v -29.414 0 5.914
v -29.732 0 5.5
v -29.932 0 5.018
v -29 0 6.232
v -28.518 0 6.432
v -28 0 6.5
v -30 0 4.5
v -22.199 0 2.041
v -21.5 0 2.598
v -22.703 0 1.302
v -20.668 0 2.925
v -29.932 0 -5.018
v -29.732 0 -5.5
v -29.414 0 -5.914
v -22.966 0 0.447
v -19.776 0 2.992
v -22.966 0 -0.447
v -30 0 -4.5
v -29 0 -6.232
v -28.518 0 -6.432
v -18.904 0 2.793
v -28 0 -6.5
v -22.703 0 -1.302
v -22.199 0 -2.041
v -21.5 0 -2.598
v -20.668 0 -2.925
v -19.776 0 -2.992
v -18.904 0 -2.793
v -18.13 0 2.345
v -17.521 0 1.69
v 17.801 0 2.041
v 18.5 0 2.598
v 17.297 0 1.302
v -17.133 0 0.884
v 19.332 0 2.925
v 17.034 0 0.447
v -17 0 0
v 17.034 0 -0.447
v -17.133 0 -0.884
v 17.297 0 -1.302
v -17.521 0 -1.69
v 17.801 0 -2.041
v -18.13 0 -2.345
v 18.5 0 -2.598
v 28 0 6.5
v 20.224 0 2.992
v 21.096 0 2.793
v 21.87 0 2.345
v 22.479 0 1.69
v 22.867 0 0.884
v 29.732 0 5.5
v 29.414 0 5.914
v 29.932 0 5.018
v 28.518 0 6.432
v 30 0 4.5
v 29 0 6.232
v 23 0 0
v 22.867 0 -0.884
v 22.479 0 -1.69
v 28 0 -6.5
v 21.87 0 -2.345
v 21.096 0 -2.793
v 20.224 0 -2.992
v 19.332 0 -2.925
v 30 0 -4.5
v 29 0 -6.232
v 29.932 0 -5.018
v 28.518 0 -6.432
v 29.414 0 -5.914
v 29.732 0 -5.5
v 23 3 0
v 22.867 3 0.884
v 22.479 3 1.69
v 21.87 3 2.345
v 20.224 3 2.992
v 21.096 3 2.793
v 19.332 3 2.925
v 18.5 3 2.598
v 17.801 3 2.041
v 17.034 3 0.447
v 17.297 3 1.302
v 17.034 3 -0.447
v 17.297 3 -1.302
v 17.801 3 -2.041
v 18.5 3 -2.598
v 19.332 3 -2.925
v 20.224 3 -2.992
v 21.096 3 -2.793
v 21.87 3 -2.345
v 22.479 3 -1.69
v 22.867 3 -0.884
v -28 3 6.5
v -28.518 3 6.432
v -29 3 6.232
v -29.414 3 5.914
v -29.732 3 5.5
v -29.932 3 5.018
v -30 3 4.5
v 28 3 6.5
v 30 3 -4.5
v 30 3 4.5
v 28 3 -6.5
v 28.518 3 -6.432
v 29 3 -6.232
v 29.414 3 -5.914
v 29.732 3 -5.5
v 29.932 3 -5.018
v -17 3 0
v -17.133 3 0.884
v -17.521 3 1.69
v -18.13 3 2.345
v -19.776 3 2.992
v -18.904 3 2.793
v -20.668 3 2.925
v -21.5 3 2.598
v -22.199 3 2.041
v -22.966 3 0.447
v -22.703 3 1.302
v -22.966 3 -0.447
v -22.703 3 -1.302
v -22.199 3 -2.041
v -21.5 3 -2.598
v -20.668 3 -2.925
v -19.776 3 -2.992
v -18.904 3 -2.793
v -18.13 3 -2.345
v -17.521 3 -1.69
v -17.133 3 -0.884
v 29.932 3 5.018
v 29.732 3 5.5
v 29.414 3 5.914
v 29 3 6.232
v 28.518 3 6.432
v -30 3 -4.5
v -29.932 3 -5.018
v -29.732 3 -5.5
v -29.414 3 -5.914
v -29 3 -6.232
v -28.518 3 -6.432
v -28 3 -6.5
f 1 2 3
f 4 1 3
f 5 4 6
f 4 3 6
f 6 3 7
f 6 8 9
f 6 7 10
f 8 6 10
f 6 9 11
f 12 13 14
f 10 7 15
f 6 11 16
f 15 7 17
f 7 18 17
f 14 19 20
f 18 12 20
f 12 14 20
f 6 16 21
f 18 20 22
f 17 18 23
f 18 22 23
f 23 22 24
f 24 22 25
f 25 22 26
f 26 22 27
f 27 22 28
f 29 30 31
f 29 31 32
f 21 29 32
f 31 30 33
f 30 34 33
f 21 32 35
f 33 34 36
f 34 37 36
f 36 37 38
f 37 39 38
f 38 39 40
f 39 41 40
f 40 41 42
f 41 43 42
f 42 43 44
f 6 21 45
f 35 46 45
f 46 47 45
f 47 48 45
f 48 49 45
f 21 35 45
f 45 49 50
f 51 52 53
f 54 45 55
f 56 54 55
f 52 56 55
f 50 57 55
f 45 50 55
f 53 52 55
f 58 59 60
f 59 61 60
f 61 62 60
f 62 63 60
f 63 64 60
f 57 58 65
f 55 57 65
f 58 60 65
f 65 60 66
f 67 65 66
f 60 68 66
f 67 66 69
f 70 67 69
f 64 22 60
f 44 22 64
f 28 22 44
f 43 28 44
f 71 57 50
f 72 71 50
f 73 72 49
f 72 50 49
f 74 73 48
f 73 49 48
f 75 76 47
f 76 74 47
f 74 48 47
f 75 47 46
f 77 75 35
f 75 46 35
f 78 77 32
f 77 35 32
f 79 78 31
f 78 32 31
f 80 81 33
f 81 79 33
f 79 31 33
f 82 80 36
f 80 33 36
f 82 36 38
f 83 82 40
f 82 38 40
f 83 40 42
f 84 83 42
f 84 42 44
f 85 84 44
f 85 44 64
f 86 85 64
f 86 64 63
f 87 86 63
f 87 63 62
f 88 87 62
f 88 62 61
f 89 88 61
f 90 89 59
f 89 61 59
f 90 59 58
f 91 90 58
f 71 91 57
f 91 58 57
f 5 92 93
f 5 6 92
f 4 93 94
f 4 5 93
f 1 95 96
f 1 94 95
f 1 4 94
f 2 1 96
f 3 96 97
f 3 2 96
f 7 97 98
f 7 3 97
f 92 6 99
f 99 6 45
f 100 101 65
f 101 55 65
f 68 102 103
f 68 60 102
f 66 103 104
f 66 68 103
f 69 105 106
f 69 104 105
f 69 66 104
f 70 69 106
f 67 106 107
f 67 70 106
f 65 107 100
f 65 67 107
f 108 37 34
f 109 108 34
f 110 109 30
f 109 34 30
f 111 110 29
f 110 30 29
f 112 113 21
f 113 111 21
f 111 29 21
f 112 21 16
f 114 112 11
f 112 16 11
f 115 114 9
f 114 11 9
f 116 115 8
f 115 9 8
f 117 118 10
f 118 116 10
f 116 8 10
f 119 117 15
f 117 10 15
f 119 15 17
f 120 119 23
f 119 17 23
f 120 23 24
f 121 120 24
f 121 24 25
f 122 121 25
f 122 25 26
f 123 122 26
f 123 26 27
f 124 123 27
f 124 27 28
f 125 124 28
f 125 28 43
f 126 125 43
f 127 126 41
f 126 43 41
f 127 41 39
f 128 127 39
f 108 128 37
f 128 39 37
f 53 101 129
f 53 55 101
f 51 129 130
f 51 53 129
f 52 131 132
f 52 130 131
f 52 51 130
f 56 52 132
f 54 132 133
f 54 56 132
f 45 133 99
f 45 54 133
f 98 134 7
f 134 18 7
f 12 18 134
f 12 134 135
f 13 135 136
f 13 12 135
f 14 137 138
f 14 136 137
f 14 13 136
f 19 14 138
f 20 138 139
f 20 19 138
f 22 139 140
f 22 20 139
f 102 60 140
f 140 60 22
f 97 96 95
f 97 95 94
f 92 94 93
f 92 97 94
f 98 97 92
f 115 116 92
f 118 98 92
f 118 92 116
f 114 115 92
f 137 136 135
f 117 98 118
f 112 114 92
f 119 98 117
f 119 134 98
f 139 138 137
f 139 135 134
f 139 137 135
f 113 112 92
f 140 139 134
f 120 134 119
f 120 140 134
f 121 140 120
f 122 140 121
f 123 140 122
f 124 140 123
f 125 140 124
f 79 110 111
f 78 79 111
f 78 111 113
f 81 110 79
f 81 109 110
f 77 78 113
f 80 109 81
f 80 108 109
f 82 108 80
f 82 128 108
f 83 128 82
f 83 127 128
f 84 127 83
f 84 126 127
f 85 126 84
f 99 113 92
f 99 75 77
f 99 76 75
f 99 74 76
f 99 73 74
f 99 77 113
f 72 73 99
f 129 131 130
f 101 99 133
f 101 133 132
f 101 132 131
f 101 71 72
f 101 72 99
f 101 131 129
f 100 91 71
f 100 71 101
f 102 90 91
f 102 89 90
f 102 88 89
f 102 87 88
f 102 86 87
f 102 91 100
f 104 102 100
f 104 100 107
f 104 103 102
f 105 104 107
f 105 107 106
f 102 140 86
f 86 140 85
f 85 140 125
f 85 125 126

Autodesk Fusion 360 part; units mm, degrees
sketch "Sketch1" plane through (0, 0, 0) normal (0, 1, 0) x (1, 0, 0)
  line L0 (28, 6.5) -> (-28, 6.5)
  line L1 (-30, 4.5) -> (-30, -4.5)
  line L2 (-28, -6.5) -> (28, -6.5)
  line L3 (30, -4.5) -> (30, 4.5)
  line L4 (30, 6.5) -> (-30, -6.5) construction
  line L5 (-30, 6.5) -> (30, -6.5) construction
  arc A0 (-30, -4.5) -> (-28, -6.5) centre (-28, -4.5) ccw
  arc A1 (28, -6.5) -> (30, -4.5) centre (28, -4.5) ccw
  arc A2 (30, 4.5) -> (28, 6.5) centre (28, 4.5) ccw
  arc A3 (-28, 6.5) -> (-30, 4.5) centre (-28, 4.5) ccw
  line L6 (0, 0) -> (20, 0) construction
  line L7 (0, 0) -> (-20, 0) construction
  circle A4 centre (20, 0) radius 3
  circle A5 centre (-20, 0) radius 3
  dimension "d1" = 60
  dimension "d2" = 13
  dimension "d3" = 2
  dimension "d4" = 2
  dimension "d5" = 20
  dimension "d6" = 20
  dimension "d7" = 6
  dimension "d8" = 6
extrude "Extrude1" add sketch "Sketch1" along normal blind 3
